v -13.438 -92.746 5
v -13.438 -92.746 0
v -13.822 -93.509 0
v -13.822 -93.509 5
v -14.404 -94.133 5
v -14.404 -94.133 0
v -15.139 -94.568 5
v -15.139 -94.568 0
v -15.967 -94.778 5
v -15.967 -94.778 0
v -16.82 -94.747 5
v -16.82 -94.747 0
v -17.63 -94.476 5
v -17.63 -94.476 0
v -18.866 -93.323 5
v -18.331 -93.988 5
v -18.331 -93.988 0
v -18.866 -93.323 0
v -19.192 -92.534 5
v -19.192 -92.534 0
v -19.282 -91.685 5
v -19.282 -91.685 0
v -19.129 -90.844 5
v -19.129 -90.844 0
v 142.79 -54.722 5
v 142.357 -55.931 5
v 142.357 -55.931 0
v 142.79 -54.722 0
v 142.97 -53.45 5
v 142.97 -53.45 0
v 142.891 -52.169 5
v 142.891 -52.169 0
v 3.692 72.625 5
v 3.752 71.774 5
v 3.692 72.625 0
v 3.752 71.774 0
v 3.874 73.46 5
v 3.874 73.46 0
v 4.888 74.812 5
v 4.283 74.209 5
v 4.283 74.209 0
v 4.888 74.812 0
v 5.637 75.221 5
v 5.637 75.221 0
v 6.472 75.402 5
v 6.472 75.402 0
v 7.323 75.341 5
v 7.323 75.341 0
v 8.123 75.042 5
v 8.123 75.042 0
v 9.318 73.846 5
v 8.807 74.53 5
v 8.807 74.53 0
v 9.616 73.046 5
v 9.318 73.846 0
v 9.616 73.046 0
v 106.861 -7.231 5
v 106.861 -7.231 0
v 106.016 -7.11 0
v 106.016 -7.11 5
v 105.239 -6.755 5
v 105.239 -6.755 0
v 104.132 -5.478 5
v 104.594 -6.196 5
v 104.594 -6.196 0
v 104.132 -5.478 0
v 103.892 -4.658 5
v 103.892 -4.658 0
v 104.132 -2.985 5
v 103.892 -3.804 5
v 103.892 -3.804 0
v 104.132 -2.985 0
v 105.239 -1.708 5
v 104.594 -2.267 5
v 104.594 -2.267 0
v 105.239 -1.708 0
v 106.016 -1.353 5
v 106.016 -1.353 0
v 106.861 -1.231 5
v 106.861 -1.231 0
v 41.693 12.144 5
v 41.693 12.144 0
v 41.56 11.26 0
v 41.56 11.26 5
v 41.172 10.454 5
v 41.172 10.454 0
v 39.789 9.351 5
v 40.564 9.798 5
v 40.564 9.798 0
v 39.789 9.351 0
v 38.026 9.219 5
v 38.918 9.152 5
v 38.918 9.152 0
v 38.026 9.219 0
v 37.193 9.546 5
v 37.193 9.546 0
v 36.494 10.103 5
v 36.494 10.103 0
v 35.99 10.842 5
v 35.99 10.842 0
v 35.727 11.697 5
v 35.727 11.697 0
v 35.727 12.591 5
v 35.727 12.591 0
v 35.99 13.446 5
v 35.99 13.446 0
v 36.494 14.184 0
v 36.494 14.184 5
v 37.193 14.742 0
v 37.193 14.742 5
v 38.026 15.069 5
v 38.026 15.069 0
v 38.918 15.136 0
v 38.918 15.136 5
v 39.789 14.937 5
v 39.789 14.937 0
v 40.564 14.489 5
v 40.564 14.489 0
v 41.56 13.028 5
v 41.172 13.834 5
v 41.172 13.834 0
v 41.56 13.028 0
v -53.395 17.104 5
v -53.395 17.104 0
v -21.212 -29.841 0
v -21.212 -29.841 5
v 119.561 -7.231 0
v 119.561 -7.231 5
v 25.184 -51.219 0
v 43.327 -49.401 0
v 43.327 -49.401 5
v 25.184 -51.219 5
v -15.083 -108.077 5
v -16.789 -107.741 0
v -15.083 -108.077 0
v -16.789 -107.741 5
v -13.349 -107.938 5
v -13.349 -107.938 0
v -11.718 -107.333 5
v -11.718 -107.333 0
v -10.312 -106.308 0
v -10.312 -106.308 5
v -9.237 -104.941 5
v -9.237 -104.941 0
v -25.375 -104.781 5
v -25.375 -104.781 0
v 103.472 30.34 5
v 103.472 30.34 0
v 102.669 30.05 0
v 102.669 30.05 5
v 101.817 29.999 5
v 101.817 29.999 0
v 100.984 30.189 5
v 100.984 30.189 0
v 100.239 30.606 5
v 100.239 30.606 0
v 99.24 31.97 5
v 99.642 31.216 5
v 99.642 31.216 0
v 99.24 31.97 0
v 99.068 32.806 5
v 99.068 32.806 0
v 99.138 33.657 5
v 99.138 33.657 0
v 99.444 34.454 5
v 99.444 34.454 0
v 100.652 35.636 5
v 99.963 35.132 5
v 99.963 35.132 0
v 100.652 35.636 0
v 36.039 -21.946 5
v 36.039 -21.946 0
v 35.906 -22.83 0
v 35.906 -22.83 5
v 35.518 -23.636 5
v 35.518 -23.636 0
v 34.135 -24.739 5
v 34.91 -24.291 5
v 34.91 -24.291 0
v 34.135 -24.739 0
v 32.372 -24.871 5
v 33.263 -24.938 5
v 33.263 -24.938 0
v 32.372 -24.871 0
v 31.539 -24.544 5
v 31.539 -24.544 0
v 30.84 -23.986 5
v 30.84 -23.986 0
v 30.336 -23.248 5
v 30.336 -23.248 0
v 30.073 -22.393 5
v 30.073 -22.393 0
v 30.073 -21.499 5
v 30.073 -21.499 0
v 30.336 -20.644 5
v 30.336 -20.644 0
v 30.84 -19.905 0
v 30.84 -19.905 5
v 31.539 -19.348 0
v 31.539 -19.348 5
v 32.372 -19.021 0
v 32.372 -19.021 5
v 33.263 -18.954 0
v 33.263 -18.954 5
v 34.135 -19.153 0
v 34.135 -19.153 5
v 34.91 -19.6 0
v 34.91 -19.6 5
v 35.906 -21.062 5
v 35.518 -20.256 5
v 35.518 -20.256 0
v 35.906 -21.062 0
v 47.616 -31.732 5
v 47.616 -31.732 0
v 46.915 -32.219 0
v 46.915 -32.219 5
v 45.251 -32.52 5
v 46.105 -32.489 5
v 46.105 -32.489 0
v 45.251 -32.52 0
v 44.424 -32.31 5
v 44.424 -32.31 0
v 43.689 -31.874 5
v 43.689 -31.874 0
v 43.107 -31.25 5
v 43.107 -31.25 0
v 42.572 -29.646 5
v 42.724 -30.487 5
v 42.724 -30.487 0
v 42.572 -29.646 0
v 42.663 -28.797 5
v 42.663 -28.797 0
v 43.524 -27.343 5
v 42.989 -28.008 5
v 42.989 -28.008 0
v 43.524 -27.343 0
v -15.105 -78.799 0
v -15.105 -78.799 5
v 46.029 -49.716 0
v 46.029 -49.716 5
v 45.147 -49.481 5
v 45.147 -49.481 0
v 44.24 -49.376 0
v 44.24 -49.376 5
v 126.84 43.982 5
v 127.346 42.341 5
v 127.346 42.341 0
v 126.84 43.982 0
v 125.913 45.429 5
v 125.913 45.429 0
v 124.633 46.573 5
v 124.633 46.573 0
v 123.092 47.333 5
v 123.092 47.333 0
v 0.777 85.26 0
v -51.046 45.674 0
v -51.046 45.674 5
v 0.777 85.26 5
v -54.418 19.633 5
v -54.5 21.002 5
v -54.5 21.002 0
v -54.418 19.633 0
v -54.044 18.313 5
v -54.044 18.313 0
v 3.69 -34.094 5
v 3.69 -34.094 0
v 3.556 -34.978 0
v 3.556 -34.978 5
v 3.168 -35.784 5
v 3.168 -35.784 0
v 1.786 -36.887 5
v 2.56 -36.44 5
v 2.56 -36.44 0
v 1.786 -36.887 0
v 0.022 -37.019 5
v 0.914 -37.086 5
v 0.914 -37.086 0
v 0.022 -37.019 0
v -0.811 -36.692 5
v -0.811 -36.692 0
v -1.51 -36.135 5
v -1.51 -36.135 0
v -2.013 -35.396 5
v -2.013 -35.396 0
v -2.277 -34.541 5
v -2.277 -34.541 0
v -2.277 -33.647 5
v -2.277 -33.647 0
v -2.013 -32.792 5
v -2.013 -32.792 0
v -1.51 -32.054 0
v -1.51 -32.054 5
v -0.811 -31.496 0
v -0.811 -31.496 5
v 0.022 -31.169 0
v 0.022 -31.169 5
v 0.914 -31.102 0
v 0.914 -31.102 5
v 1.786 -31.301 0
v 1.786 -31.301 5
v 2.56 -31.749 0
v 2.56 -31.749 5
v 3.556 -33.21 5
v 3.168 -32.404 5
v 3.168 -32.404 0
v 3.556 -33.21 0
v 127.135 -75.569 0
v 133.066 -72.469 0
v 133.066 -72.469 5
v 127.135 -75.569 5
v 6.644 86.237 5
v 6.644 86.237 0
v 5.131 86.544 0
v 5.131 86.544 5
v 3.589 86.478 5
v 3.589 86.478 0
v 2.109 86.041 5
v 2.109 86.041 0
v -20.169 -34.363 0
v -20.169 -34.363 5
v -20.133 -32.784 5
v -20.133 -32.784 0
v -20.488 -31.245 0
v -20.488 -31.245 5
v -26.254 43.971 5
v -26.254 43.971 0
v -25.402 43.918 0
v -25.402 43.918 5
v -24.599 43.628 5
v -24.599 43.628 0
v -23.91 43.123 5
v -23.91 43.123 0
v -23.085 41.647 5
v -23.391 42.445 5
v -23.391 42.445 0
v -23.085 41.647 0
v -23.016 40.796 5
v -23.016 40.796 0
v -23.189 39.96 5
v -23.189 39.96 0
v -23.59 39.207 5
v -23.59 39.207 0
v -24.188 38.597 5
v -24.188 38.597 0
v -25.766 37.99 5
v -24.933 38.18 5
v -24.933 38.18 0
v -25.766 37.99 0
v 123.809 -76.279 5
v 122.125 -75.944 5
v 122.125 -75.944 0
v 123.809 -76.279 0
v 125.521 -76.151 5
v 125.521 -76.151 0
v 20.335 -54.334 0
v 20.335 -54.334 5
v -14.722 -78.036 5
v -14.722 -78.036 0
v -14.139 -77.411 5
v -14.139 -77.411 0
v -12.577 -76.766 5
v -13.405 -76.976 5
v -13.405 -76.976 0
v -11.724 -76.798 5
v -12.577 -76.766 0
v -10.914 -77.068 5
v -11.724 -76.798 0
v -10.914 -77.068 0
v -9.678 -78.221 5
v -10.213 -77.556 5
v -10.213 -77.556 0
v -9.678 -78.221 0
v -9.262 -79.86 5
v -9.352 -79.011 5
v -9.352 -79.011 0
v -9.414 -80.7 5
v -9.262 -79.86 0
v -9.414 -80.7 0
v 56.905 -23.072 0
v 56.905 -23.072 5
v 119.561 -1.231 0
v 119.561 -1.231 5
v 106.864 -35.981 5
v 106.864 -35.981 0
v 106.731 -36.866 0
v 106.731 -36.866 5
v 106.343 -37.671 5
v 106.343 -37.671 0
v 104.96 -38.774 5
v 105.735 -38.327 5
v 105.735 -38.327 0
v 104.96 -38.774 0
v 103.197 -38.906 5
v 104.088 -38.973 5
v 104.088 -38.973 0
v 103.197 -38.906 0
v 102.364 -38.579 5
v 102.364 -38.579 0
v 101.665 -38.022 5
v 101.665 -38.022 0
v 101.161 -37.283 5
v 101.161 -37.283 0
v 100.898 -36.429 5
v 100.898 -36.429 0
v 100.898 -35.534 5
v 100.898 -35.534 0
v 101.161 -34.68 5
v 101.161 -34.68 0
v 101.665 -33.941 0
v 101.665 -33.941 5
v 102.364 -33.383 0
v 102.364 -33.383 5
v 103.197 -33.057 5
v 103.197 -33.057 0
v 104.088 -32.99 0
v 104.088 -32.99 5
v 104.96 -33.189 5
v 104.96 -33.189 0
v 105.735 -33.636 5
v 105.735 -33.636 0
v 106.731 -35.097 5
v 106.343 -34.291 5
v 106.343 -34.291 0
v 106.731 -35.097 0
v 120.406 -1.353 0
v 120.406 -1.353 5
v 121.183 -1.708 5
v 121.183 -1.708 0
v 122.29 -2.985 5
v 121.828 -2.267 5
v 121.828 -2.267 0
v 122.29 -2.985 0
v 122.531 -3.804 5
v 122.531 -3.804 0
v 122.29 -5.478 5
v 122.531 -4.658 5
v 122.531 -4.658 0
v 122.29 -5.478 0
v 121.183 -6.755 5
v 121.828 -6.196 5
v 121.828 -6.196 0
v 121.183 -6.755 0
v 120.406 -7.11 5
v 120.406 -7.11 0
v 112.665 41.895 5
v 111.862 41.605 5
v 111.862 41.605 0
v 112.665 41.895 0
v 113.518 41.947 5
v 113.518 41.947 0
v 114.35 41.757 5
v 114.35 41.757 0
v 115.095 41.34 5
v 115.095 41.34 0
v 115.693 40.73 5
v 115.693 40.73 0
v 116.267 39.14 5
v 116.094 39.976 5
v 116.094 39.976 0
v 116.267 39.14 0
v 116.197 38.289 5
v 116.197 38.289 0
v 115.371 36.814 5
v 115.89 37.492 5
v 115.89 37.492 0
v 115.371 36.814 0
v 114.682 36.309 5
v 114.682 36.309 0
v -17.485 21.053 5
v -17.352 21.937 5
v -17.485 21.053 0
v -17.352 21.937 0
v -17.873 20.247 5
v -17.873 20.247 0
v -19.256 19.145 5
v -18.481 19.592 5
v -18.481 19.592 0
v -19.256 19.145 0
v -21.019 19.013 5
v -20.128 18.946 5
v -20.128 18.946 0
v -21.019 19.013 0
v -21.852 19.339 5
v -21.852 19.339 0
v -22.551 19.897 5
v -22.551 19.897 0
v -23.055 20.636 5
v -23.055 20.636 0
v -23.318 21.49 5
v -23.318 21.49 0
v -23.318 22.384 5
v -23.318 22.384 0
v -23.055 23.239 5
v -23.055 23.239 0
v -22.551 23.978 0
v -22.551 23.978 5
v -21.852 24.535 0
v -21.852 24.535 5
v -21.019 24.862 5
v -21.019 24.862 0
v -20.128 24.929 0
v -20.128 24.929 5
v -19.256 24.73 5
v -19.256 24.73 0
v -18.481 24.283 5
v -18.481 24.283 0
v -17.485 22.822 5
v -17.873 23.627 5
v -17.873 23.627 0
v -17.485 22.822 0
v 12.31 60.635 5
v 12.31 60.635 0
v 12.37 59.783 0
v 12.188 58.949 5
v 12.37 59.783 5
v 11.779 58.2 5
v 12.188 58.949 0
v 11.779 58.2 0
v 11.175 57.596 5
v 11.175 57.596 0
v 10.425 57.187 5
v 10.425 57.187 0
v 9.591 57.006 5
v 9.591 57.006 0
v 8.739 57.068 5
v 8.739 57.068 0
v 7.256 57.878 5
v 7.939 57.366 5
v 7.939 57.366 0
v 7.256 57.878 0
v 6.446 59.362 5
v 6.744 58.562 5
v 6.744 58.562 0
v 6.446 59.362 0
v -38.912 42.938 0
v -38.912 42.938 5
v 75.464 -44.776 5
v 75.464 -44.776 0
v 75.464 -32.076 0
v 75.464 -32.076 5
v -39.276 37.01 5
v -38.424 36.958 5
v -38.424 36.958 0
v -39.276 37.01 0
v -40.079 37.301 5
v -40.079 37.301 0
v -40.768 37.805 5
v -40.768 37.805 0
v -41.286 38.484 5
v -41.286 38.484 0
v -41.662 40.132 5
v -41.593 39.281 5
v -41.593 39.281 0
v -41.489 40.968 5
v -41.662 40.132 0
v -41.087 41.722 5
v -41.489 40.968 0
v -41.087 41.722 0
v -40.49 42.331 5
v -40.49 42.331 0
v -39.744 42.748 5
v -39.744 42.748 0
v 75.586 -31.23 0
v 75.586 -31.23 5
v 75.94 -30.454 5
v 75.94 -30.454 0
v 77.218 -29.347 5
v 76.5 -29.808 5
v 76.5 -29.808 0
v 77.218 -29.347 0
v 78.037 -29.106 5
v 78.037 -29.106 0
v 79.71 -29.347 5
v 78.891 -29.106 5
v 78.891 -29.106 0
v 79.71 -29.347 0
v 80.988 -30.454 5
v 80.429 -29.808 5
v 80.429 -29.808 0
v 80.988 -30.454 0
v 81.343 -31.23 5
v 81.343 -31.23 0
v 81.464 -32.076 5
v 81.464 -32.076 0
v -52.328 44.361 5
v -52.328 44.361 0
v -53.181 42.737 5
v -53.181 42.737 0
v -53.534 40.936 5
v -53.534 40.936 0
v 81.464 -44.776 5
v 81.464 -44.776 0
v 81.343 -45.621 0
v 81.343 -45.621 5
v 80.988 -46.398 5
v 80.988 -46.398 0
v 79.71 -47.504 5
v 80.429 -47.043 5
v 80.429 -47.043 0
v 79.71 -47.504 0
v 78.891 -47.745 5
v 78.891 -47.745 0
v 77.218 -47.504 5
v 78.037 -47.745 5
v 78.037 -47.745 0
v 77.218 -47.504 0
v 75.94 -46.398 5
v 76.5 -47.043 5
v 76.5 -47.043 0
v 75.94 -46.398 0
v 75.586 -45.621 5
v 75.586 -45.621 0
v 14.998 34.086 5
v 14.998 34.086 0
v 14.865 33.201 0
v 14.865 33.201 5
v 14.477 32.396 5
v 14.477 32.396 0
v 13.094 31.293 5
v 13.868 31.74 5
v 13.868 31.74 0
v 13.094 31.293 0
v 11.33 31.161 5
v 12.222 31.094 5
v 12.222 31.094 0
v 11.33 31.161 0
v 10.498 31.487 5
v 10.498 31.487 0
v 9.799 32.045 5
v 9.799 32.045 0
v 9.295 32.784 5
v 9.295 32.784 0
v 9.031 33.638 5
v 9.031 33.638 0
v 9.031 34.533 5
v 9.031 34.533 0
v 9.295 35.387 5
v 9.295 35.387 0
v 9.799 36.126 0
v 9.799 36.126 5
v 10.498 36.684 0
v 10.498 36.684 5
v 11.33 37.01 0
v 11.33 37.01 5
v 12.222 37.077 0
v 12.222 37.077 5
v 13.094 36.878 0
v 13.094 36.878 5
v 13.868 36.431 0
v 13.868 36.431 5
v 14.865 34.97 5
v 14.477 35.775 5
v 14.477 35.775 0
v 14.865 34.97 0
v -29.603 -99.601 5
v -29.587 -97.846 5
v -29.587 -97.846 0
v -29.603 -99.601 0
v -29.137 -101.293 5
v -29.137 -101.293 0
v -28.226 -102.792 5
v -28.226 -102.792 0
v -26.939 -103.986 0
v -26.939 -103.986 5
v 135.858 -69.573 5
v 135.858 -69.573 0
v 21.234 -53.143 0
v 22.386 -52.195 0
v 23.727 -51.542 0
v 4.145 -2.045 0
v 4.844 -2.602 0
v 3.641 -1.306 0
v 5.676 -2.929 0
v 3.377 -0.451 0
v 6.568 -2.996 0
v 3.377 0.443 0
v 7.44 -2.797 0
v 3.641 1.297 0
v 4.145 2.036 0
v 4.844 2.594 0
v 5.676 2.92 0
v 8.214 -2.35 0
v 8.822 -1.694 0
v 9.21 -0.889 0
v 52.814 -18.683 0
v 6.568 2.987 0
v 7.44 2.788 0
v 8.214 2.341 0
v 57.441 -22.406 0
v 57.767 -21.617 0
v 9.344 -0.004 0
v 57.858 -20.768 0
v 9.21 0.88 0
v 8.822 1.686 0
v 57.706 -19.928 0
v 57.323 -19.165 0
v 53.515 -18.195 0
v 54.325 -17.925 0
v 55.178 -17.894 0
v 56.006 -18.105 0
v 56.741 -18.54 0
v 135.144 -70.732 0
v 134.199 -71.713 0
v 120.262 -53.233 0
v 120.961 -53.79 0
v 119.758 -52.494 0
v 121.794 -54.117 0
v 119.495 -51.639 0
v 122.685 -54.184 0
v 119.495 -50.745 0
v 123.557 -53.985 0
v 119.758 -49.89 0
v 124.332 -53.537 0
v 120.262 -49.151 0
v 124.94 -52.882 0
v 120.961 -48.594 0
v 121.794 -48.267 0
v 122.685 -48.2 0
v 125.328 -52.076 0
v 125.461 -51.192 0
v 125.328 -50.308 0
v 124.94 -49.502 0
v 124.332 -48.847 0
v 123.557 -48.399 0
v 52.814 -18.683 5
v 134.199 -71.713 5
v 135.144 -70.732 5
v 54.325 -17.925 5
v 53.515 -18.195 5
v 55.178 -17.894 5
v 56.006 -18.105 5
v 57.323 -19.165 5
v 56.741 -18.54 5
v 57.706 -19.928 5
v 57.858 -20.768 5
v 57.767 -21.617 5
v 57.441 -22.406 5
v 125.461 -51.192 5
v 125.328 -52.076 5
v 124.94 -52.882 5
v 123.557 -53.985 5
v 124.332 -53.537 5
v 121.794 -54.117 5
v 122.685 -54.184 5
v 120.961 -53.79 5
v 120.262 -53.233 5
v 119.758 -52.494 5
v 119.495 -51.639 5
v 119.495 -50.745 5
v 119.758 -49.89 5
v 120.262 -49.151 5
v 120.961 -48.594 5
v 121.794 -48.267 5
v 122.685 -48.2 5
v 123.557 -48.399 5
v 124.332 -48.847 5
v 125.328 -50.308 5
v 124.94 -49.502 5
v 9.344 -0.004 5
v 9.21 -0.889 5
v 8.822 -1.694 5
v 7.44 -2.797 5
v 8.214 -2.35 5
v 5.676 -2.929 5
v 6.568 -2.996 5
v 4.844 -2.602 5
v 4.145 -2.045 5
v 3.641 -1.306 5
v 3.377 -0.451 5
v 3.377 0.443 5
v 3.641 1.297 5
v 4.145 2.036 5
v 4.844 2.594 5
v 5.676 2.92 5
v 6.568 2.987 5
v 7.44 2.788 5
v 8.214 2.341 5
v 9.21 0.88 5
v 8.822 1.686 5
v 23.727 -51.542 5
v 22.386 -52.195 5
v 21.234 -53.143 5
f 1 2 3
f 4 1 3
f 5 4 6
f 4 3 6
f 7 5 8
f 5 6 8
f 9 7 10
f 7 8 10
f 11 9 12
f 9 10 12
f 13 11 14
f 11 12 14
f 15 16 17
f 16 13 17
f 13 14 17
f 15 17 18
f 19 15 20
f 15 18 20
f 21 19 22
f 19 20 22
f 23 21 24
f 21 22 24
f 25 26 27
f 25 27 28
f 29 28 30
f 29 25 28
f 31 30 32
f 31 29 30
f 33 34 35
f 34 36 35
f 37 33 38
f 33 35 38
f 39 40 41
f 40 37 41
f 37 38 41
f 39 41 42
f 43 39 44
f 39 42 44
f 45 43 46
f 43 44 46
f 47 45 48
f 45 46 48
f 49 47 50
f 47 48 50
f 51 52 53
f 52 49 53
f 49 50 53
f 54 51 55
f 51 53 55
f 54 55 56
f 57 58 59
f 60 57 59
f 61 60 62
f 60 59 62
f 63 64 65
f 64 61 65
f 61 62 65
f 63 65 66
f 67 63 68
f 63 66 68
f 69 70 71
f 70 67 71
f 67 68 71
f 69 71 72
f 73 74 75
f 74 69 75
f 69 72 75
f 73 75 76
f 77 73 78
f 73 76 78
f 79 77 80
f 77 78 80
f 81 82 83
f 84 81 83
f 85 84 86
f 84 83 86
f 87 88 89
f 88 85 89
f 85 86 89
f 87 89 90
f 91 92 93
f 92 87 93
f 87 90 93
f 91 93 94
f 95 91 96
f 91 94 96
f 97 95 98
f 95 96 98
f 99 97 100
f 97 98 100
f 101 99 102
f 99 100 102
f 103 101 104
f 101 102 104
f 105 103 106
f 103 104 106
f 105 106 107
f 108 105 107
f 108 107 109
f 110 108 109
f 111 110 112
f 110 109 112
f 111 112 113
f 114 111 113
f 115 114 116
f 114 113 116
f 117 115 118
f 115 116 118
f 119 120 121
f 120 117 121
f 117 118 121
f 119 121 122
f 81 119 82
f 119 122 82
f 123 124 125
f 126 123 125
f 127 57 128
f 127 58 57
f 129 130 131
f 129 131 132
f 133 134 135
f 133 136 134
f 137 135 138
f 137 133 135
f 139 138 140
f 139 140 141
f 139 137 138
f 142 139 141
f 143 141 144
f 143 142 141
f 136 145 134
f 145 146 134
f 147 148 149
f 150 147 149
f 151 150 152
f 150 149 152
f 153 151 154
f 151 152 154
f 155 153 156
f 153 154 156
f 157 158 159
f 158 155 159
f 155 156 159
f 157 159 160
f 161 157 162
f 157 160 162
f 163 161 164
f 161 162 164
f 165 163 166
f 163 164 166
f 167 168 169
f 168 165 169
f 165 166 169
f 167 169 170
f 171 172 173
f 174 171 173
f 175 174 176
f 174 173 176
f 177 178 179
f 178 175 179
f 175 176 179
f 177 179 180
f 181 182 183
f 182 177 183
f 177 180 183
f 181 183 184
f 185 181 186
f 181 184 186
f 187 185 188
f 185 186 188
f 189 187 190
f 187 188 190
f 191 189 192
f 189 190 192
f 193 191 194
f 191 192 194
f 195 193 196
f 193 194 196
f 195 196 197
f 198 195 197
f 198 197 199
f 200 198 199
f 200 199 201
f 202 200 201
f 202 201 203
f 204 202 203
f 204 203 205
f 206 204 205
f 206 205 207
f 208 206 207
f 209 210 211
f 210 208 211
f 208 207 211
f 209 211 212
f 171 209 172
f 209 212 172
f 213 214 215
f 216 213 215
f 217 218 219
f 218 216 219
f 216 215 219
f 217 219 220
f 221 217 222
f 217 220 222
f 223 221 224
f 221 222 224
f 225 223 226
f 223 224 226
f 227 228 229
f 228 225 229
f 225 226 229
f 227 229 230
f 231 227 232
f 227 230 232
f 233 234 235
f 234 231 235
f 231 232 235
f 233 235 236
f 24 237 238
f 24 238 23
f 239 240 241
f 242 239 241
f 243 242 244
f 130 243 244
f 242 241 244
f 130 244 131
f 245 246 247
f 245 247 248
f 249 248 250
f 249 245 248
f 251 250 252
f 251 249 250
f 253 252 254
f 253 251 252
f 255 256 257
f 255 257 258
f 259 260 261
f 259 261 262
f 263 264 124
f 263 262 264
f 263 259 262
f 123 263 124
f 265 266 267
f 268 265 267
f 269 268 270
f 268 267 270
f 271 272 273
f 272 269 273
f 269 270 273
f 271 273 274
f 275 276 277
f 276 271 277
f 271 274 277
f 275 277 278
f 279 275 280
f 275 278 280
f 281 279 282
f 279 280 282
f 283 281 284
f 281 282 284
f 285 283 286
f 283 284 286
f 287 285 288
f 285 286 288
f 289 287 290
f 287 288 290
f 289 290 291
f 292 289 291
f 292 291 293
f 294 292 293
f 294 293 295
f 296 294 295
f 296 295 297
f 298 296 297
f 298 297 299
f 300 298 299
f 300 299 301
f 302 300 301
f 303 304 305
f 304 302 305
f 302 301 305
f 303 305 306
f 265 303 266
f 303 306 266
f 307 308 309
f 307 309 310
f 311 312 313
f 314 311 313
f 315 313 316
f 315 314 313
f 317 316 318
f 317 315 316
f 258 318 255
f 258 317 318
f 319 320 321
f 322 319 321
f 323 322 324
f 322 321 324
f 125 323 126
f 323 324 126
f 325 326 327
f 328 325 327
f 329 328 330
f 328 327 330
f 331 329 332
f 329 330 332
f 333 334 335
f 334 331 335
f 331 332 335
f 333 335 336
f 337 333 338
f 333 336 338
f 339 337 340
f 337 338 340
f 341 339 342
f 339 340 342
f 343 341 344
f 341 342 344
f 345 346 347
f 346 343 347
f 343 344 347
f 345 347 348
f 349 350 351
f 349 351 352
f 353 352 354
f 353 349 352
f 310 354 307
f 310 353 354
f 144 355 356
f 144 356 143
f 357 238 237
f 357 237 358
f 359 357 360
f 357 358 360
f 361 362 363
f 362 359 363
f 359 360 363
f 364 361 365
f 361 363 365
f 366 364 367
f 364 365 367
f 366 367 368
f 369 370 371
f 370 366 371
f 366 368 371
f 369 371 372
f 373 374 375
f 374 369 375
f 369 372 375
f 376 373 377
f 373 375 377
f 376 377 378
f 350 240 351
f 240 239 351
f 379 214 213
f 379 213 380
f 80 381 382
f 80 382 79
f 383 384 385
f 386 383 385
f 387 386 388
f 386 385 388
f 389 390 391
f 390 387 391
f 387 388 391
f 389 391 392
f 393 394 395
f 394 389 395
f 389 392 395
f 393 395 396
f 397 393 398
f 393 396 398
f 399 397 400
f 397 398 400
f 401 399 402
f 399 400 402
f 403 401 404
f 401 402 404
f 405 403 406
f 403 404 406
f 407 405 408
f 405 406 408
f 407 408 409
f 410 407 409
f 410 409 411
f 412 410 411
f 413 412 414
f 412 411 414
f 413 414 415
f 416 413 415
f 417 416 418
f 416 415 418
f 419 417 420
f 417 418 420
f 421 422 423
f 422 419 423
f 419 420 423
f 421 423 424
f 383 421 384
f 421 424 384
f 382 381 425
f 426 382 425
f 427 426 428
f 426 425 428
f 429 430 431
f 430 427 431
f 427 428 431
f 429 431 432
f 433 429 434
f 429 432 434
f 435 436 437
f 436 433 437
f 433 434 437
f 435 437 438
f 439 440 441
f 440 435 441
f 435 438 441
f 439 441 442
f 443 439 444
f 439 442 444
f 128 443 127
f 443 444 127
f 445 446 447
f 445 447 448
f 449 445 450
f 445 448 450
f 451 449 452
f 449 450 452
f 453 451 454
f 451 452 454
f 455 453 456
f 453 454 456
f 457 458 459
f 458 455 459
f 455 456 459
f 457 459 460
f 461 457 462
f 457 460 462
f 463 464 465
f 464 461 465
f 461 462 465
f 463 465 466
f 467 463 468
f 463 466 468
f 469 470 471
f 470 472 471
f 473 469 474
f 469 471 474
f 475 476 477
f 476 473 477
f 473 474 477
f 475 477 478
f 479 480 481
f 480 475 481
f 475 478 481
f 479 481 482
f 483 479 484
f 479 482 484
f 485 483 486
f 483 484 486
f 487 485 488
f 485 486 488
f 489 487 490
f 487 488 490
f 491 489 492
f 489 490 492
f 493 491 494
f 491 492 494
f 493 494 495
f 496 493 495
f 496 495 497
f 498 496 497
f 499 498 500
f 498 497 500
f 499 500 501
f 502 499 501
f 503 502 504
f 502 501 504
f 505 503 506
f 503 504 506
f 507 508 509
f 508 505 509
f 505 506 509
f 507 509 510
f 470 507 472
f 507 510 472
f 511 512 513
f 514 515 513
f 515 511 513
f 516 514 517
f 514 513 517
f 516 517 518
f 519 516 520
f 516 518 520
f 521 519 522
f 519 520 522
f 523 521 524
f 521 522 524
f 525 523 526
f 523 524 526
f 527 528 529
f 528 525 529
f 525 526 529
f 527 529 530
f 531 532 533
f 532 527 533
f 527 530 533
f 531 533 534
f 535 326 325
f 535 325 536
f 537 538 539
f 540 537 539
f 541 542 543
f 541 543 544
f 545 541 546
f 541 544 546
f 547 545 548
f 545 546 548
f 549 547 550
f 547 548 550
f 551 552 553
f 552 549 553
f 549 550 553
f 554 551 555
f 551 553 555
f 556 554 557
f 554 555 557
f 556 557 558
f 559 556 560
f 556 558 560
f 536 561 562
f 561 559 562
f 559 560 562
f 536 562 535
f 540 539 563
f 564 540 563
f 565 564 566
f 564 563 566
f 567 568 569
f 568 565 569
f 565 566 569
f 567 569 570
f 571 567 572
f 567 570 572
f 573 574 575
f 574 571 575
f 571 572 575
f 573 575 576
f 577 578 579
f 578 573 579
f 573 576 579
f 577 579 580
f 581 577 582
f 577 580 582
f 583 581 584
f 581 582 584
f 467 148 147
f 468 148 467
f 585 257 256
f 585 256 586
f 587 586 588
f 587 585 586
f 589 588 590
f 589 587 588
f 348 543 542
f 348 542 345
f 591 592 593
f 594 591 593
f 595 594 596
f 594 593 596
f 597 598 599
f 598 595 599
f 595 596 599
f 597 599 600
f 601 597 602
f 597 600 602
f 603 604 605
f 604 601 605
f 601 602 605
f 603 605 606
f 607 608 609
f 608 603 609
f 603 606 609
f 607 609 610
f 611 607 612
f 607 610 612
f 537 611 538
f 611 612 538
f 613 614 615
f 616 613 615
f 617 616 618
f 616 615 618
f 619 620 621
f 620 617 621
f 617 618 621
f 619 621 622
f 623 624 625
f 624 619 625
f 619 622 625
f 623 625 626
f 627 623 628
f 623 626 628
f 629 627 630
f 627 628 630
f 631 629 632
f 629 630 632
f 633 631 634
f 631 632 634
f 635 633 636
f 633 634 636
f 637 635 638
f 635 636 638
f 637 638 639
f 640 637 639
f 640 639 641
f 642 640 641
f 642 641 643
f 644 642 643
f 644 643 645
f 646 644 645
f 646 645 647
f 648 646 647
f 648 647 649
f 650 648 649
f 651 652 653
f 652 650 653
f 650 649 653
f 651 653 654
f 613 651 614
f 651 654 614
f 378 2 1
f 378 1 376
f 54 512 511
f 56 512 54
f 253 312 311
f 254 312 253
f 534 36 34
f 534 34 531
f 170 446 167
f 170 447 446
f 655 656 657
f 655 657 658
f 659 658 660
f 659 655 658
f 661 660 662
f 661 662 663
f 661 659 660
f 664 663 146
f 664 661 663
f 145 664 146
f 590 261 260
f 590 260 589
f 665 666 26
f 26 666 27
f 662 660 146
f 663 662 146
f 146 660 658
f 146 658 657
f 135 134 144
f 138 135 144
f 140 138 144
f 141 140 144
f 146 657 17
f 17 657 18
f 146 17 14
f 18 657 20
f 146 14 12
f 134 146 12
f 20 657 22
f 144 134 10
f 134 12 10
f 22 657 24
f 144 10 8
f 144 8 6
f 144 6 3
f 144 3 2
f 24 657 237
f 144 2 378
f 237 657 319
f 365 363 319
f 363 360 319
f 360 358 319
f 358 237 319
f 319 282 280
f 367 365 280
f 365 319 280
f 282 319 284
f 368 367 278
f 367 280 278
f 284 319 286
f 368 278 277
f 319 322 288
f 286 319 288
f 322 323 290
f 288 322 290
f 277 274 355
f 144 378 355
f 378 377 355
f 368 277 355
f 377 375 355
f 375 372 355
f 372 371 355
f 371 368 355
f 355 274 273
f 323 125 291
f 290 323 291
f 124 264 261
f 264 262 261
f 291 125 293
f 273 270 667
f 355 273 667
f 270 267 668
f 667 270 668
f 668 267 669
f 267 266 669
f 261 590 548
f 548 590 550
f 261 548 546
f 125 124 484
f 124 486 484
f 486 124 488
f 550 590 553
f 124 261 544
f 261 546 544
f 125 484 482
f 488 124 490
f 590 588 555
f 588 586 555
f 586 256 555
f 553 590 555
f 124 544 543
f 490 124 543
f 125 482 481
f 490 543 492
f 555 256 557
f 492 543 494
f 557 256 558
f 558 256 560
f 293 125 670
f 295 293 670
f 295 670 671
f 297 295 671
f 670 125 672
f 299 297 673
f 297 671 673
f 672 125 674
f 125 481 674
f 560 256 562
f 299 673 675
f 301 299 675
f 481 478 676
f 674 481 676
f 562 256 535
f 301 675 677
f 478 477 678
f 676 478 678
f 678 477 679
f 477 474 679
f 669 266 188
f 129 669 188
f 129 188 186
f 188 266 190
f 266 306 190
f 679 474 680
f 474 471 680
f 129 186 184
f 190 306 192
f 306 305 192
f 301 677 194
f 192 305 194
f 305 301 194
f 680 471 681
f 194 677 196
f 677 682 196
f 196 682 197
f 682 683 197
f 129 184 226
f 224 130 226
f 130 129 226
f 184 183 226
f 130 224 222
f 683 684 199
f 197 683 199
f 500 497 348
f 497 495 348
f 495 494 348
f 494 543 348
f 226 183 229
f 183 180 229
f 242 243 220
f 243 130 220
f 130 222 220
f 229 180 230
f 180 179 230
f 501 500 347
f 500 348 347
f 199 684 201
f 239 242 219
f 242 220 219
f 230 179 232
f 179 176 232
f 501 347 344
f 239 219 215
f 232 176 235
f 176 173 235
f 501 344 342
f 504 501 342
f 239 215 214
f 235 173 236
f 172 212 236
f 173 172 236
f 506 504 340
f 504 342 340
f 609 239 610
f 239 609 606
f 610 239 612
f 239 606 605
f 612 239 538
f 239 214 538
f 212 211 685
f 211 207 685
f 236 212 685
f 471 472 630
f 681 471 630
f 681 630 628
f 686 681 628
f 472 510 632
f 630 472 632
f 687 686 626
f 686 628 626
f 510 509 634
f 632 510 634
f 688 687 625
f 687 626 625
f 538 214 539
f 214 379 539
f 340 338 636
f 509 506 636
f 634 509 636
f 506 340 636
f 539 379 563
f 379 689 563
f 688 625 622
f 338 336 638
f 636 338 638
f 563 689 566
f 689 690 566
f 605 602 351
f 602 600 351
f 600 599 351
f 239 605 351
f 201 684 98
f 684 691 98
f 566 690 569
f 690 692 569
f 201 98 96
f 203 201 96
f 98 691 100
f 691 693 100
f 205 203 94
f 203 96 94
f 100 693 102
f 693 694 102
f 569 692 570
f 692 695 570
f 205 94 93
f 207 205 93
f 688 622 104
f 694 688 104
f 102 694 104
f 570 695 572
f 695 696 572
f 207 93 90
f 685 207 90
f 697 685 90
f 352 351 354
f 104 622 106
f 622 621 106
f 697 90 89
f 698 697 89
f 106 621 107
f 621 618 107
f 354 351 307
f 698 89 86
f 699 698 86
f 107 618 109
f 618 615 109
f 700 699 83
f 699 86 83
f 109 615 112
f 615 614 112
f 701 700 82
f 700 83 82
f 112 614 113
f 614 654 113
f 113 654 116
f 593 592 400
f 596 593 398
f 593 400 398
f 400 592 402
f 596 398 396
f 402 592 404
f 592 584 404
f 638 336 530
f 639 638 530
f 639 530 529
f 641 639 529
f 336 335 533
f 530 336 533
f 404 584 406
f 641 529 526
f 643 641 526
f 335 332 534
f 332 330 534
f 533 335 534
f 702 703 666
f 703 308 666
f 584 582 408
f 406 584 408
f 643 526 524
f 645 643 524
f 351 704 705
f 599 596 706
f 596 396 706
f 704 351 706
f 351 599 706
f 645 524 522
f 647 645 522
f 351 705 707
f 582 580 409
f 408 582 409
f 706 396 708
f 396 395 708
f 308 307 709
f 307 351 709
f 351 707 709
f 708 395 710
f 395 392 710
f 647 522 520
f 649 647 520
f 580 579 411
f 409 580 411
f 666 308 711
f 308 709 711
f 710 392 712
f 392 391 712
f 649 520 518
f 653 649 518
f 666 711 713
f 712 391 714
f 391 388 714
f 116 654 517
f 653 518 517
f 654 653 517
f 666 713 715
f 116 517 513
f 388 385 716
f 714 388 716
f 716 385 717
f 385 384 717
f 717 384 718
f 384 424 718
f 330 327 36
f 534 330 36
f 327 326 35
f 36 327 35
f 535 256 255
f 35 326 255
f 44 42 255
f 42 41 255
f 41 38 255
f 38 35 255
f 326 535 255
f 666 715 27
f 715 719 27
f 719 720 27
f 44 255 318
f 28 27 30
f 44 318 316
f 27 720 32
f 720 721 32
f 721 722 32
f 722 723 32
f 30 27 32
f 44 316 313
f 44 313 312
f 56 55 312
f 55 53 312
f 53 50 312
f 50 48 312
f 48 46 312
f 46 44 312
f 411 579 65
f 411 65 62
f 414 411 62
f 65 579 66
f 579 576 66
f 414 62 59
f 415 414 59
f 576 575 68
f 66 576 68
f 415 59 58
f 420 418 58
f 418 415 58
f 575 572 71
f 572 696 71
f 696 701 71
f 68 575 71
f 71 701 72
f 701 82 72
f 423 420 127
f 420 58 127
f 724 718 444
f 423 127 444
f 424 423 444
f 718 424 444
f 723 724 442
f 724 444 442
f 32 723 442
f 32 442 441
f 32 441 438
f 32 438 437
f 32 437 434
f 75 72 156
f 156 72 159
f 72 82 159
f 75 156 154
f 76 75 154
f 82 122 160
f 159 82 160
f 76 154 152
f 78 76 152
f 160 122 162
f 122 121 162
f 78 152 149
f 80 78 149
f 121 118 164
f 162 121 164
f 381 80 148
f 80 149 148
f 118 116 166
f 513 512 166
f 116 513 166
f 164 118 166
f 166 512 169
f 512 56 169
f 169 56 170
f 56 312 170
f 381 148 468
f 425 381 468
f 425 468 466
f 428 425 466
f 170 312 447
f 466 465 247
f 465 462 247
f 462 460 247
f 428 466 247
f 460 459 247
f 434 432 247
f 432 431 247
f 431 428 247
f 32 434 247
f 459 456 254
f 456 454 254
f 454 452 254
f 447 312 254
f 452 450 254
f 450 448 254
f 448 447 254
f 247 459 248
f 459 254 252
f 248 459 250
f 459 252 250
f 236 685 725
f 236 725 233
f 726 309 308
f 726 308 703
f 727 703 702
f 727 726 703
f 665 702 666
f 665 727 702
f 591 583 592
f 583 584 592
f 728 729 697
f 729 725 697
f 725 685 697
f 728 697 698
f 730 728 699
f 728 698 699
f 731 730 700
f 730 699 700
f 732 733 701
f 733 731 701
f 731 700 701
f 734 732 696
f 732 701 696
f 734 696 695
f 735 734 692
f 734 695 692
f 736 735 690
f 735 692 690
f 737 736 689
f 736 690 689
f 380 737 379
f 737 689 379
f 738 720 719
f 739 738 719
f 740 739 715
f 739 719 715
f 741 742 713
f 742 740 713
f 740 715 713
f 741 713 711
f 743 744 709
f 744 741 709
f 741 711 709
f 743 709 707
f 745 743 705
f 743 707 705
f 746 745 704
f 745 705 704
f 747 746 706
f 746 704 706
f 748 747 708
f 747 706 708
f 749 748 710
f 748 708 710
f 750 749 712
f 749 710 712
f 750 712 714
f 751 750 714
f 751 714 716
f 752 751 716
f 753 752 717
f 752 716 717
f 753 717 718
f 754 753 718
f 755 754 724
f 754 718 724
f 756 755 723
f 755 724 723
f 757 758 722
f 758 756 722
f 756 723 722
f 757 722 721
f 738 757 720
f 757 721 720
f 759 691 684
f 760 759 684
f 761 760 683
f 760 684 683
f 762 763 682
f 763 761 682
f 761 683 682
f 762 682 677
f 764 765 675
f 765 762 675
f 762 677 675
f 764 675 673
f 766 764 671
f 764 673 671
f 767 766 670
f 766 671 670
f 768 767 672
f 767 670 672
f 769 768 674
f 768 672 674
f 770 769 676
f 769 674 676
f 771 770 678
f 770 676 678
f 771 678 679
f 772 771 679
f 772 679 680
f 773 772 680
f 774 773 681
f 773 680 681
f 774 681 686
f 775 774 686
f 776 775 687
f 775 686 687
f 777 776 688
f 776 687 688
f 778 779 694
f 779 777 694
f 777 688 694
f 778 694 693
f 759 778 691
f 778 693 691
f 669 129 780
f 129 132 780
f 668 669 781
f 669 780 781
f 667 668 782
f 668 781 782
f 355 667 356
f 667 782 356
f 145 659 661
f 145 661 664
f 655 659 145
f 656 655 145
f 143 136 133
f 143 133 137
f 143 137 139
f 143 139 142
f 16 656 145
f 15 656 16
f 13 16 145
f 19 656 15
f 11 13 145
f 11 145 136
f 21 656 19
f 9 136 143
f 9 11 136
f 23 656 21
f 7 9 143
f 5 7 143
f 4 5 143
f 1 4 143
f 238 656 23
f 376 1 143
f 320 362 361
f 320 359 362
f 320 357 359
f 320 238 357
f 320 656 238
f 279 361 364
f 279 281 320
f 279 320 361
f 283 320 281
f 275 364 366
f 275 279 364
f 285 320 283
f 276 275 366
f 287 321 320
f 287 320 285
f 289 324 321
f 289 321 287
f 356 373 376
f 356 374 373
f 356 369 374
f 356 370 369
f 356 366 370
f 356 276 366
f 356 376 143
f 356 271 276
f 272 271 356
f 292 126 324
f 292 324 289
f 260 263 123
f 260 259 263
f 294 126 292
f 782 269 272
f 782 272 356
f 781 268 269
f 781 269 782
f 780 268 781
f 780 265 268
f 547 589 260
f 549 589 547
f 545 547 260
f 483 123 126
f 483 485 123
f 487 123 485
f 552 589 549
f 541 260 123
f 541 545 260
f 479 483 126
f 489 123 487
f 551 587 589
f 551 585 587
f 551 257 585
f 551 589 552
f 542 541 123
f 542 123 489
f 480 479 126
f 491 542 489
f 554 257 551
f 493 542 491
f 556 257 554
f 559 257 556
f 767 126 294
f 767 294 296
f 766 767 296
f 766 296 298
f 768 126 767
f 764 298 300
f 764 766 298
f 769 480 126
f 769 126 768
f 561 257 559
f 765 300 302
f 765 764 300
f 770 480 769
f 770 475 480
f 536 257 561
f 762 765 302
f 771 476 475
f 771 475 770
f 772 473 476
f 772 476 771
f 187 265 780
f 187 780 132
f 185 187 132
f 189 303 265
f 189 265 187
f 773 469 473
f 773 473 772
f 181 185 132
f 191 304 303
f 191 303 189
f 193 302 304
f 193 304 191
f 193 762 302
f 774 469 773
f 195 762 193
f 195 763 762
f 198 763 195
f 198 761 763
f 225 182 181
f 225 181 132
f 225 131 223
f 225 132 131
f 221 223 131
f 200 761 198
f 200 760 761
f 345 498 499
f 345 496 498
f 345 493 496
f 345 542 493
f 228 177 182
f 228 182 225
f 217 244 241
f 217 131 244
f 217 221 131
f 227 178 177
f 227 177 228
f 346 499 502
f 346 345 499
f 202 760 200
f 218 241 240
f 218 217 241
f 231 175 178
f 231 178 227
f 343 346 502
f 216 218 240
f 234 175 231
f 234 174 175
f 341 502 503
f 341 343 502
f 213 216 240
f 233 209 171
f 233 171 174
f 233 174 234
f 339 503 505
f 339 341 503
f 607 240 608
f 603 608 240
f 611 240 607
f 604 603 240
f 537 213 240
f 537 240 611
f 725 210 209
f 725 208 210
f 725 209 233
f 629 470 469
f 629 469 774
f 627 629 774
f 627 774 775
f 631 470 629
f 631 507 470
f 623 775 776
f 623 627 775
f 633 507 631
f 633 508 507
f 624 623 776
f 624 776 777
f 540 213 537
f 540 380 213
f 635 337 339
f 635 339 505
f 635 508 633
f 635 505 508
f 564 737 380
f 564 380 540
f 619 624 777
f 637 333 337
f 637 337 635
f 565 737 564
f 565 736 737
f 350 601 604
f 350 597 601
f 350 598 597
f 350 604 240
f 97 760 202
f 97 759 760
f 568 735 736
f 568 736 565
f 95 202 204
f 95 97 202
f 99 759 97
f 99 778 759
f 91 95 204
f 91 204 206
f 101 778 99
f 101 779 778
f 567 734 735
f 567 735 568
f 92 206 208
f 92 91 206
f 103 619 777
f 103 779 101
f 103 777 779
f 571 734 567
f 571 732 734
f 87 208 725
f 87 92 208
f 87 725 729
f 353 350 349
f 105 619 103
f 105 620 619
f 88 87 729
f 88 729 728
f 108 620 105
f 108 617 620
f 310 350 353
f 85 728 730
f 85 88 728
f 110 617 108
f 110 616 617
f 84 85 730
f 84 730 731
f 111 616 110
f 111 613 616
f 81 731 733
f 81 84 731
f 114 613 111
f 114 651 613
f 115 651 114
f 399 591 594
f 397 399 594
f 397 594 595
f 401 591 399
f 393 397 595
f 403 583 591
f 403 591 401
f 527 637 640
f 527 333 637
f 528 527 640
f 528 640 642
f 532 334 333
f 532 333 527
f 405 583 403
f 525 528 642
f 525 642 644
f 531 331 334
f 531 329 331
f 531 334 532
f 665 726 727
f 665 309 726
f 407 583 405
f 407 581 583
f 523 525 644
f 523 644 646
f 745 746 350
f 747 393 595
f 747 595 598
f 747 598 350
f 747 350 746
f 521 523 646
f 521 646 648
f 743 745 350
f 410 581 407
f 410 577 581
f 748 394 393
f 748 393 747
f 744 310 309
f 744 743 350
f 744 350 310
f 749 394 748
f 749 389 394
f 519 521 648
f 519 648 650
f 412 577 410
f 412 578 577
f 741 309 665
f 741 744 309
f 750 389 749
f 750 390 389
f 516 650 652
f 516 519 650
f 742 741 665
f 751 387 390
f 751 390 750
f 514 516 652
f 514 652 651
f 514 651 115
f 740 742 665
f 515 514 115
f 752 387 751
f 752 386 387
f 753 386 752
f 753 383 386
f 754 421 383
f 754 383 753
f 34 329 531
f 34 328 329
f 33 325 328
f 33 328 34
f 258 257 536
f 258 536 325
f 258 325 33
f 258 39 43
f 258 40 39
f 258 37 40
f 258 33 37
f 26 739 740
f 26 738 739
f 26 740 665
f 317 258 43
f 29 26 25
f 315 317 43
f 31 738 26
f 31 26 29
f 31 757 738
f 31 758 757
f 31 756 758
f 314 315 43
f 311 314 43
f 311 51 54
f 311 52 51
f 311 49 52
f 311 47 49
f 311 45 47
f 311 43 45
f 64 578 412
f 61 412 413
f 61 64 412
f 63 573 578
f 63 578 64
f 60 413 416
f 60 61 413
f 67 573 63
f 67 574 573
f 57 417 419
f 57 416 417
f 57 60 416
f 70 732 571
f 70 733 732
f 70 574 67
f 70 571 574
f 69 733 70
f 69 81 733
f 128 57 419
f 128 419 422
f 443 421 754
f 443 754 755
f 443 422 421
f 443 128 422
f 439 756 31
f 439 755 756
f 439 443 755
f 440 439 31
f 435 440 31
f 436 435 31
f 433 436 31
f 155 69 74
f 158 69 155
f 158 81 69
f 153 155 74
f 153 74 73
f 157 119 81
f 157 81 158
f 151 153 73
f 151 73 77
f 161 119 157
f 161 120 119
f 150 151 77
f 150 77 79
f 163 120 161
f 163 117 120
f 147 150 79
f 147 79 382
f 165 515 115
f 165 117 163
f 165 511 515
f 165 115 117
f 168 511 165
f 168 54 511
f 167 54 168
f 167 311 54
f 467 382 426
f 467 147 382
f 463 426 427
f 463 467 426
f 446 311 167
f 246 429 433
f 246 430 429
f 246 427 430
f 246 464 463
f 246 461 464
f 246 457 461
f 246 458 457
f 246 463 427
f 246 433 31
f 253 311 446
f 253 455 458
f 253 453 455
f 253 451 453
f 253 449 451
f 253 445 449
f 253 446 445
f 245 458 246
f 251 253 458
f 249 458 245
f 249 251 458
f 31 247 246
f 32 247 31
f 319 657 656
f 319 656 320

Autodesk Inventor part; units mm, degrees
ref_plane "YZ Plane" through (0, 0, 0) normal (1, 0, 0) x (0, 1, 0)
ref_plane "XZ Plane" through (0, 0, 0) normal (0, 1, 0) x (-1, 0, 0)
ref_plane "XY Plane" through (0, 0, 0) normal (0, 0, 1) x (1, 0, 0)
sketch "Base" plane through (0, 0, 0) normal (0, 0, 1) x (1, 0, 0)
  circle A0 centre (6.3437, -0.0043) radius 44.7044
  line L0 (-53.391, 43.8831) -> (3.4518, 87.3031)
  line L1 (3.4518, 87.3031) -> (126.7242, 46.1195)
  line L2 (21.9665, -51.542) -> (-11.8651, -109.4379)
  line L3 (134.9457, -71.4872) -> (143.2137, -54.1334)
  line L4 (44.7126, -49.2622) -> (124.7112, -76.8356)
  line L5 (44.7126, -49.2622) -> (21.9665, -51.542)
  line L6 (126.7242, 46.1195) -> (143.2137, -54.1334)
  line L7 (134.9457, -71.4872) -> (124.7112, -76.8356)
  line L8 (-30.3614, -103.0627) -> (-11.8651, -109.4379)
  line L9 (-30.3614, -103.0627) -> (-19.8027, -31.8971)
  line L10 (-54.6035, 18.8674) -> (-53.391, 43.8831)
  line L11 (-54.6035, 18.8674) -> (-19.8027, -31.8971)
  line L12 (-94.1669, 0) -> (182.7771, 0) construction
  circle A1 centre (6.3437, -0.0043) radius 3
  circle A2 centre (103.8642, -35.9814) radius 3
  line L13 (126.7242, 46.1195) -> (-19.8027, -31.8971) construction
  line L14 (3.4518, 87.3031) -> (33.3396, -50.4021) construction
  line L15 (-53.9972, 31.3753) -> (126.7242, 46.1195) construction
  line L16 (134.969, -4.007) -> (-37.2031, -6.5149) construction
  line L17 (-21.1132, -106.2503) -> (39.5241, 75.2519) construction
  line L18 (78.4642, -60.8955) -> (78.4642, 62.2425) construction
  line L19 (21.9665, -51.542) -> (126.7242, 46.1195) construction
  line L20 (0, 0) -> (-53.391, 43.8831) construction
  circle A3 centre (-20.3518, 21.9373) radius 3
  circle A4 centre (6.3437, -0.0043) radius 34.5555 construction
  circle A5 centre (-26.006, -12.1525) radius 3
  circle A6 centre (0.6895, -34.0941) radius 3
  circle A7 centre (33.0392, -21.9459) radius 3
  circle A8 centre (38.6934, 12.1439) radius 3
  circle A9 centre (11.9979, 34.0855) radius 3
  line L21 (113.2722, 38.9571) -> (102.0622, 32.9885) construction
  line L22 (111.8623, 41.6052) -> (100.6522, 35.6365)
  line L23 (103.4721, 30.3404) -> (114.6821, 36.3091)
  arc A10 (114.6821, 36.3091) -> (111.8623, 41.6052) centre (113.2722, 38.9571) ccw
  arc A11 (100.6522, 35.6365) -> (103.4721, 30.3404) centre (102.0622, 32.9885) ccw
  line L24 (119.5611, -4.2314) -> (106.8611, -4.2314) construction
  line L25 (119.5611, -1.2314) -> (106.8611, -1.2314)
  line L26 (106.8611, -7.2314) -> (119.5611, -7.2314)
  arc A12 (119.5611, -7.2314) -> (119.5611, -1.2314) centre (119.5611, -4.2314) ccw
  arc A13 (106.8611, -1.2314) -> (106.8611, -7.2314) centre (106.8611, -4.2314) ccw
  line L27 (6.6843, 72.4098) -> (9.378, 59.9988) construction
  line L28 (3.7525, 71.7735) -> (6.4462, 59.3625)
  line L29 (12.3097, 60.6351) -> (9.616, 73.0462)
  arc A14 (9.616, 73.0462) -> (3.7525, 71.7735) centre (6.6843, 72.4098) ccw
  arc A15 (6.4462, 59.3625) -> (12.3097, 60.6351) centre (9.378, 59.9988) ccw
  line L30 (-16.2839, -91.795) -> (-12.2597, -79.7494) construction
  line L31 (-13.4385, -92.7456) -> (-9.4142, -80.7)
  line L32 (-15.1051, -78.7988) -> (-19.1293, -90.8444)
  arc A16 (-19.1293, -90.8444) -> (-13.4385, -92.7456) centre (-16.2839, -91.795) ccw
  arc A17 (-9.4142, -80.7) -> (-15.1051, -78.7988) centre (-12.2597, -79.7494) ccw
  line L33 (78.4642, -44.7756) -> (78.4642, -32.0756) construction
  line L34 (75.4642, -44.7756) -> (75.4642, -32.0756)
  line L35 (81.4642, -32.0756) -> (81.4642, -44.7756)
  arc A18 (75.4642, -44.7756) -> (81.4642, -44.7756) centre (78.4642, -44.7756) ccw
  arc A19 (81.4642, -32.0756) -> (75.4642, -32.0756) centre (78.4642, -32.0756) ccw
  line L36 (-38.6678, 39.9478) -> (-26.0099, 40.9805) construction
  line L37 (-38.4239, 36.9578) -> (-25.766, 37.9905)
  line L38 (-26.2538, 43.9706) -> (-38.9118, 42.9379)
  arc A20 (-38.9118, 42.9379) -> (-38.4239, 36.9578) centre (-38.6678, 39.9478) ccw
  arc A21 (-25.766, 37.9905) -> (-26.2538, 43.9706) centre (-26.0099, 40.9805) ccw
  line L39 (45.5702, -29.5373) -> (54.8596, -20.8771) construction
  line L40 (47.6159, -31.7316) -> (56.9053, -23.0715)
  line L41 (52.8139, -18.6828) -> (43.5245, -27.3429)
  arc A22 (43.5245, -27.3429) -> (47.6159, -31.7316) centre (45.5702, -29.5373) ccw
  arc A23 (56.9053, -23.0715) -> (52.8139, -18.6828) centre (54.8596, -20.8771) ccw
  line L42 (-38.6678, 39.9478) -> (-53.391, 43.8831) construction
  circle A24 centre (122.4612, -51.192) radius 3
  point P0 (107.6672, 35.9728)
  point P1 (113.2111, -4.2314)
  point P2 (8.0311, 66.2043)
  point P3 (-14.2718, -85.7722)
  point P4 (78.4642, -38.4256)
  point P5 (-32.3389, 40.4642)
  point P6 (50.2149, -25.2072)
  dimension "d48" = 69.111
  dimension "d1" = 89.4088
  dimension "d2" = 55.568
  dimension "d3" = 37.094
  dimension "d4" = 120.3
  dimension "d5" = 81.561
  dimension "d6" = 160.982
  dimension "d7" = 133.392
  dimension "d8" = 143.066
  dimension "d9" = 145.185
  dimension "d10" = 124.151
  dimension "d11" = 130.15
  dimension "d12" = 142.793
  dimension "d13" = 117.814
  dimension "d14" = 19.5642
  dimension "d15" = 25.0158
  dimension "d16" = 71.529
  dimension "d17" = 61.5478
  dimension "d18" = 129.9699
  dimension "d19" = 101.6
  dimension "d20" = 19.2227
  dimension "d21" = 11.5477
  dimension "d22" = 84.6172
  dimension "d23" = 67.056
  dimension "d24" = 22.86
  dimension "d25" = 39.5986
  dimension "d26" = 71.1371
  dimension "d29" = 6
  dimension "d30" = 6
  dimension "d31" = 48.26
  dimension "d32" = 6
  dimension "d35" = 360
  dimension "d37" = 6
  dimension "d38" = 6
  dimension "d39" = 15.24
  dimension "d40" = 12.7
  dimension "d41" = 15.24
  dimension "d43" = 15.24
  dimension "d44" = 15.24
  dimension "d45" = 15.24
  dimension "d46" = 15.7016
  dimension "d49" = 140.583
  dimension "d50" = 4.2314
  dimension "d51" = 91.5631
  dimension "d52" = 12.1439
  dimension "d53" = 0
  dimension "d60" = 126.024
  dimension "d61" = 155.259
  dimension "d63" = 15.24
  dimension "d64" = 12.0647
  dimension "d67" = 25.4
  dimension "d68" = 31.75
  dimension "d69" = 6
  dimension "d70" = 20
  dimension "d71" = 20
  dimension "d72" = 3
  dimension "d73" = 3
  dimension "d74" = 3
  dimension "d75" = 3
  dimension "d76" = 3
  dimension "d77" = 3
  dimension "d78" = 3
  dimension "d79" = 3
  dimension "d80" = 3
  dimension "d81" = 3
extrude "Plate1" add sketch "Base" along normal blind 5 contours A0 L9 L11 | A0 L11 L10 L0 L1 L6 L3 L7 L4 L5 L2 L8 L9 | A5 picked at (-13.3863, 3.3874)
fillet "OutsideFilletsFeature" radius 6.35 12 edges at (126.7242, 46.1195, 2.5) (3.4518, 87.3031, 2.5) (143.2137, -54.1334, 2.5) (134.9457, -71.4872, 2.5) (124.7112, -76.8356, 2.5) (-11.8651, -109.4379, 2.5) (44.7126, -49.2622, 2.5) (21.9665, -51.542, 2.5) (-30.3614, -103.0627, 2.5) (-19.8027, -31.8971, 2.5) (-54.6035, 18.8674, 2.5) (-53.391, 43.8831, 2.5)
sketch "HandleAttachment" plane through (0, 0, 0) normal (0, 0, -1) x (-1, 0, 0)
  circle A0 centre (-122.4612, -51.192) radius 3 projected
  point P0 (0, 0)
equation "\"d41\" = d39"
equation "\"d43\" = d39"
equation "\"d44\" = d43"
equation "\"d45\" = d43"
equation "\"d47\" = Thickness"
equation "\"Thickness\" = 5"
properties part number "UpperLeg2"
